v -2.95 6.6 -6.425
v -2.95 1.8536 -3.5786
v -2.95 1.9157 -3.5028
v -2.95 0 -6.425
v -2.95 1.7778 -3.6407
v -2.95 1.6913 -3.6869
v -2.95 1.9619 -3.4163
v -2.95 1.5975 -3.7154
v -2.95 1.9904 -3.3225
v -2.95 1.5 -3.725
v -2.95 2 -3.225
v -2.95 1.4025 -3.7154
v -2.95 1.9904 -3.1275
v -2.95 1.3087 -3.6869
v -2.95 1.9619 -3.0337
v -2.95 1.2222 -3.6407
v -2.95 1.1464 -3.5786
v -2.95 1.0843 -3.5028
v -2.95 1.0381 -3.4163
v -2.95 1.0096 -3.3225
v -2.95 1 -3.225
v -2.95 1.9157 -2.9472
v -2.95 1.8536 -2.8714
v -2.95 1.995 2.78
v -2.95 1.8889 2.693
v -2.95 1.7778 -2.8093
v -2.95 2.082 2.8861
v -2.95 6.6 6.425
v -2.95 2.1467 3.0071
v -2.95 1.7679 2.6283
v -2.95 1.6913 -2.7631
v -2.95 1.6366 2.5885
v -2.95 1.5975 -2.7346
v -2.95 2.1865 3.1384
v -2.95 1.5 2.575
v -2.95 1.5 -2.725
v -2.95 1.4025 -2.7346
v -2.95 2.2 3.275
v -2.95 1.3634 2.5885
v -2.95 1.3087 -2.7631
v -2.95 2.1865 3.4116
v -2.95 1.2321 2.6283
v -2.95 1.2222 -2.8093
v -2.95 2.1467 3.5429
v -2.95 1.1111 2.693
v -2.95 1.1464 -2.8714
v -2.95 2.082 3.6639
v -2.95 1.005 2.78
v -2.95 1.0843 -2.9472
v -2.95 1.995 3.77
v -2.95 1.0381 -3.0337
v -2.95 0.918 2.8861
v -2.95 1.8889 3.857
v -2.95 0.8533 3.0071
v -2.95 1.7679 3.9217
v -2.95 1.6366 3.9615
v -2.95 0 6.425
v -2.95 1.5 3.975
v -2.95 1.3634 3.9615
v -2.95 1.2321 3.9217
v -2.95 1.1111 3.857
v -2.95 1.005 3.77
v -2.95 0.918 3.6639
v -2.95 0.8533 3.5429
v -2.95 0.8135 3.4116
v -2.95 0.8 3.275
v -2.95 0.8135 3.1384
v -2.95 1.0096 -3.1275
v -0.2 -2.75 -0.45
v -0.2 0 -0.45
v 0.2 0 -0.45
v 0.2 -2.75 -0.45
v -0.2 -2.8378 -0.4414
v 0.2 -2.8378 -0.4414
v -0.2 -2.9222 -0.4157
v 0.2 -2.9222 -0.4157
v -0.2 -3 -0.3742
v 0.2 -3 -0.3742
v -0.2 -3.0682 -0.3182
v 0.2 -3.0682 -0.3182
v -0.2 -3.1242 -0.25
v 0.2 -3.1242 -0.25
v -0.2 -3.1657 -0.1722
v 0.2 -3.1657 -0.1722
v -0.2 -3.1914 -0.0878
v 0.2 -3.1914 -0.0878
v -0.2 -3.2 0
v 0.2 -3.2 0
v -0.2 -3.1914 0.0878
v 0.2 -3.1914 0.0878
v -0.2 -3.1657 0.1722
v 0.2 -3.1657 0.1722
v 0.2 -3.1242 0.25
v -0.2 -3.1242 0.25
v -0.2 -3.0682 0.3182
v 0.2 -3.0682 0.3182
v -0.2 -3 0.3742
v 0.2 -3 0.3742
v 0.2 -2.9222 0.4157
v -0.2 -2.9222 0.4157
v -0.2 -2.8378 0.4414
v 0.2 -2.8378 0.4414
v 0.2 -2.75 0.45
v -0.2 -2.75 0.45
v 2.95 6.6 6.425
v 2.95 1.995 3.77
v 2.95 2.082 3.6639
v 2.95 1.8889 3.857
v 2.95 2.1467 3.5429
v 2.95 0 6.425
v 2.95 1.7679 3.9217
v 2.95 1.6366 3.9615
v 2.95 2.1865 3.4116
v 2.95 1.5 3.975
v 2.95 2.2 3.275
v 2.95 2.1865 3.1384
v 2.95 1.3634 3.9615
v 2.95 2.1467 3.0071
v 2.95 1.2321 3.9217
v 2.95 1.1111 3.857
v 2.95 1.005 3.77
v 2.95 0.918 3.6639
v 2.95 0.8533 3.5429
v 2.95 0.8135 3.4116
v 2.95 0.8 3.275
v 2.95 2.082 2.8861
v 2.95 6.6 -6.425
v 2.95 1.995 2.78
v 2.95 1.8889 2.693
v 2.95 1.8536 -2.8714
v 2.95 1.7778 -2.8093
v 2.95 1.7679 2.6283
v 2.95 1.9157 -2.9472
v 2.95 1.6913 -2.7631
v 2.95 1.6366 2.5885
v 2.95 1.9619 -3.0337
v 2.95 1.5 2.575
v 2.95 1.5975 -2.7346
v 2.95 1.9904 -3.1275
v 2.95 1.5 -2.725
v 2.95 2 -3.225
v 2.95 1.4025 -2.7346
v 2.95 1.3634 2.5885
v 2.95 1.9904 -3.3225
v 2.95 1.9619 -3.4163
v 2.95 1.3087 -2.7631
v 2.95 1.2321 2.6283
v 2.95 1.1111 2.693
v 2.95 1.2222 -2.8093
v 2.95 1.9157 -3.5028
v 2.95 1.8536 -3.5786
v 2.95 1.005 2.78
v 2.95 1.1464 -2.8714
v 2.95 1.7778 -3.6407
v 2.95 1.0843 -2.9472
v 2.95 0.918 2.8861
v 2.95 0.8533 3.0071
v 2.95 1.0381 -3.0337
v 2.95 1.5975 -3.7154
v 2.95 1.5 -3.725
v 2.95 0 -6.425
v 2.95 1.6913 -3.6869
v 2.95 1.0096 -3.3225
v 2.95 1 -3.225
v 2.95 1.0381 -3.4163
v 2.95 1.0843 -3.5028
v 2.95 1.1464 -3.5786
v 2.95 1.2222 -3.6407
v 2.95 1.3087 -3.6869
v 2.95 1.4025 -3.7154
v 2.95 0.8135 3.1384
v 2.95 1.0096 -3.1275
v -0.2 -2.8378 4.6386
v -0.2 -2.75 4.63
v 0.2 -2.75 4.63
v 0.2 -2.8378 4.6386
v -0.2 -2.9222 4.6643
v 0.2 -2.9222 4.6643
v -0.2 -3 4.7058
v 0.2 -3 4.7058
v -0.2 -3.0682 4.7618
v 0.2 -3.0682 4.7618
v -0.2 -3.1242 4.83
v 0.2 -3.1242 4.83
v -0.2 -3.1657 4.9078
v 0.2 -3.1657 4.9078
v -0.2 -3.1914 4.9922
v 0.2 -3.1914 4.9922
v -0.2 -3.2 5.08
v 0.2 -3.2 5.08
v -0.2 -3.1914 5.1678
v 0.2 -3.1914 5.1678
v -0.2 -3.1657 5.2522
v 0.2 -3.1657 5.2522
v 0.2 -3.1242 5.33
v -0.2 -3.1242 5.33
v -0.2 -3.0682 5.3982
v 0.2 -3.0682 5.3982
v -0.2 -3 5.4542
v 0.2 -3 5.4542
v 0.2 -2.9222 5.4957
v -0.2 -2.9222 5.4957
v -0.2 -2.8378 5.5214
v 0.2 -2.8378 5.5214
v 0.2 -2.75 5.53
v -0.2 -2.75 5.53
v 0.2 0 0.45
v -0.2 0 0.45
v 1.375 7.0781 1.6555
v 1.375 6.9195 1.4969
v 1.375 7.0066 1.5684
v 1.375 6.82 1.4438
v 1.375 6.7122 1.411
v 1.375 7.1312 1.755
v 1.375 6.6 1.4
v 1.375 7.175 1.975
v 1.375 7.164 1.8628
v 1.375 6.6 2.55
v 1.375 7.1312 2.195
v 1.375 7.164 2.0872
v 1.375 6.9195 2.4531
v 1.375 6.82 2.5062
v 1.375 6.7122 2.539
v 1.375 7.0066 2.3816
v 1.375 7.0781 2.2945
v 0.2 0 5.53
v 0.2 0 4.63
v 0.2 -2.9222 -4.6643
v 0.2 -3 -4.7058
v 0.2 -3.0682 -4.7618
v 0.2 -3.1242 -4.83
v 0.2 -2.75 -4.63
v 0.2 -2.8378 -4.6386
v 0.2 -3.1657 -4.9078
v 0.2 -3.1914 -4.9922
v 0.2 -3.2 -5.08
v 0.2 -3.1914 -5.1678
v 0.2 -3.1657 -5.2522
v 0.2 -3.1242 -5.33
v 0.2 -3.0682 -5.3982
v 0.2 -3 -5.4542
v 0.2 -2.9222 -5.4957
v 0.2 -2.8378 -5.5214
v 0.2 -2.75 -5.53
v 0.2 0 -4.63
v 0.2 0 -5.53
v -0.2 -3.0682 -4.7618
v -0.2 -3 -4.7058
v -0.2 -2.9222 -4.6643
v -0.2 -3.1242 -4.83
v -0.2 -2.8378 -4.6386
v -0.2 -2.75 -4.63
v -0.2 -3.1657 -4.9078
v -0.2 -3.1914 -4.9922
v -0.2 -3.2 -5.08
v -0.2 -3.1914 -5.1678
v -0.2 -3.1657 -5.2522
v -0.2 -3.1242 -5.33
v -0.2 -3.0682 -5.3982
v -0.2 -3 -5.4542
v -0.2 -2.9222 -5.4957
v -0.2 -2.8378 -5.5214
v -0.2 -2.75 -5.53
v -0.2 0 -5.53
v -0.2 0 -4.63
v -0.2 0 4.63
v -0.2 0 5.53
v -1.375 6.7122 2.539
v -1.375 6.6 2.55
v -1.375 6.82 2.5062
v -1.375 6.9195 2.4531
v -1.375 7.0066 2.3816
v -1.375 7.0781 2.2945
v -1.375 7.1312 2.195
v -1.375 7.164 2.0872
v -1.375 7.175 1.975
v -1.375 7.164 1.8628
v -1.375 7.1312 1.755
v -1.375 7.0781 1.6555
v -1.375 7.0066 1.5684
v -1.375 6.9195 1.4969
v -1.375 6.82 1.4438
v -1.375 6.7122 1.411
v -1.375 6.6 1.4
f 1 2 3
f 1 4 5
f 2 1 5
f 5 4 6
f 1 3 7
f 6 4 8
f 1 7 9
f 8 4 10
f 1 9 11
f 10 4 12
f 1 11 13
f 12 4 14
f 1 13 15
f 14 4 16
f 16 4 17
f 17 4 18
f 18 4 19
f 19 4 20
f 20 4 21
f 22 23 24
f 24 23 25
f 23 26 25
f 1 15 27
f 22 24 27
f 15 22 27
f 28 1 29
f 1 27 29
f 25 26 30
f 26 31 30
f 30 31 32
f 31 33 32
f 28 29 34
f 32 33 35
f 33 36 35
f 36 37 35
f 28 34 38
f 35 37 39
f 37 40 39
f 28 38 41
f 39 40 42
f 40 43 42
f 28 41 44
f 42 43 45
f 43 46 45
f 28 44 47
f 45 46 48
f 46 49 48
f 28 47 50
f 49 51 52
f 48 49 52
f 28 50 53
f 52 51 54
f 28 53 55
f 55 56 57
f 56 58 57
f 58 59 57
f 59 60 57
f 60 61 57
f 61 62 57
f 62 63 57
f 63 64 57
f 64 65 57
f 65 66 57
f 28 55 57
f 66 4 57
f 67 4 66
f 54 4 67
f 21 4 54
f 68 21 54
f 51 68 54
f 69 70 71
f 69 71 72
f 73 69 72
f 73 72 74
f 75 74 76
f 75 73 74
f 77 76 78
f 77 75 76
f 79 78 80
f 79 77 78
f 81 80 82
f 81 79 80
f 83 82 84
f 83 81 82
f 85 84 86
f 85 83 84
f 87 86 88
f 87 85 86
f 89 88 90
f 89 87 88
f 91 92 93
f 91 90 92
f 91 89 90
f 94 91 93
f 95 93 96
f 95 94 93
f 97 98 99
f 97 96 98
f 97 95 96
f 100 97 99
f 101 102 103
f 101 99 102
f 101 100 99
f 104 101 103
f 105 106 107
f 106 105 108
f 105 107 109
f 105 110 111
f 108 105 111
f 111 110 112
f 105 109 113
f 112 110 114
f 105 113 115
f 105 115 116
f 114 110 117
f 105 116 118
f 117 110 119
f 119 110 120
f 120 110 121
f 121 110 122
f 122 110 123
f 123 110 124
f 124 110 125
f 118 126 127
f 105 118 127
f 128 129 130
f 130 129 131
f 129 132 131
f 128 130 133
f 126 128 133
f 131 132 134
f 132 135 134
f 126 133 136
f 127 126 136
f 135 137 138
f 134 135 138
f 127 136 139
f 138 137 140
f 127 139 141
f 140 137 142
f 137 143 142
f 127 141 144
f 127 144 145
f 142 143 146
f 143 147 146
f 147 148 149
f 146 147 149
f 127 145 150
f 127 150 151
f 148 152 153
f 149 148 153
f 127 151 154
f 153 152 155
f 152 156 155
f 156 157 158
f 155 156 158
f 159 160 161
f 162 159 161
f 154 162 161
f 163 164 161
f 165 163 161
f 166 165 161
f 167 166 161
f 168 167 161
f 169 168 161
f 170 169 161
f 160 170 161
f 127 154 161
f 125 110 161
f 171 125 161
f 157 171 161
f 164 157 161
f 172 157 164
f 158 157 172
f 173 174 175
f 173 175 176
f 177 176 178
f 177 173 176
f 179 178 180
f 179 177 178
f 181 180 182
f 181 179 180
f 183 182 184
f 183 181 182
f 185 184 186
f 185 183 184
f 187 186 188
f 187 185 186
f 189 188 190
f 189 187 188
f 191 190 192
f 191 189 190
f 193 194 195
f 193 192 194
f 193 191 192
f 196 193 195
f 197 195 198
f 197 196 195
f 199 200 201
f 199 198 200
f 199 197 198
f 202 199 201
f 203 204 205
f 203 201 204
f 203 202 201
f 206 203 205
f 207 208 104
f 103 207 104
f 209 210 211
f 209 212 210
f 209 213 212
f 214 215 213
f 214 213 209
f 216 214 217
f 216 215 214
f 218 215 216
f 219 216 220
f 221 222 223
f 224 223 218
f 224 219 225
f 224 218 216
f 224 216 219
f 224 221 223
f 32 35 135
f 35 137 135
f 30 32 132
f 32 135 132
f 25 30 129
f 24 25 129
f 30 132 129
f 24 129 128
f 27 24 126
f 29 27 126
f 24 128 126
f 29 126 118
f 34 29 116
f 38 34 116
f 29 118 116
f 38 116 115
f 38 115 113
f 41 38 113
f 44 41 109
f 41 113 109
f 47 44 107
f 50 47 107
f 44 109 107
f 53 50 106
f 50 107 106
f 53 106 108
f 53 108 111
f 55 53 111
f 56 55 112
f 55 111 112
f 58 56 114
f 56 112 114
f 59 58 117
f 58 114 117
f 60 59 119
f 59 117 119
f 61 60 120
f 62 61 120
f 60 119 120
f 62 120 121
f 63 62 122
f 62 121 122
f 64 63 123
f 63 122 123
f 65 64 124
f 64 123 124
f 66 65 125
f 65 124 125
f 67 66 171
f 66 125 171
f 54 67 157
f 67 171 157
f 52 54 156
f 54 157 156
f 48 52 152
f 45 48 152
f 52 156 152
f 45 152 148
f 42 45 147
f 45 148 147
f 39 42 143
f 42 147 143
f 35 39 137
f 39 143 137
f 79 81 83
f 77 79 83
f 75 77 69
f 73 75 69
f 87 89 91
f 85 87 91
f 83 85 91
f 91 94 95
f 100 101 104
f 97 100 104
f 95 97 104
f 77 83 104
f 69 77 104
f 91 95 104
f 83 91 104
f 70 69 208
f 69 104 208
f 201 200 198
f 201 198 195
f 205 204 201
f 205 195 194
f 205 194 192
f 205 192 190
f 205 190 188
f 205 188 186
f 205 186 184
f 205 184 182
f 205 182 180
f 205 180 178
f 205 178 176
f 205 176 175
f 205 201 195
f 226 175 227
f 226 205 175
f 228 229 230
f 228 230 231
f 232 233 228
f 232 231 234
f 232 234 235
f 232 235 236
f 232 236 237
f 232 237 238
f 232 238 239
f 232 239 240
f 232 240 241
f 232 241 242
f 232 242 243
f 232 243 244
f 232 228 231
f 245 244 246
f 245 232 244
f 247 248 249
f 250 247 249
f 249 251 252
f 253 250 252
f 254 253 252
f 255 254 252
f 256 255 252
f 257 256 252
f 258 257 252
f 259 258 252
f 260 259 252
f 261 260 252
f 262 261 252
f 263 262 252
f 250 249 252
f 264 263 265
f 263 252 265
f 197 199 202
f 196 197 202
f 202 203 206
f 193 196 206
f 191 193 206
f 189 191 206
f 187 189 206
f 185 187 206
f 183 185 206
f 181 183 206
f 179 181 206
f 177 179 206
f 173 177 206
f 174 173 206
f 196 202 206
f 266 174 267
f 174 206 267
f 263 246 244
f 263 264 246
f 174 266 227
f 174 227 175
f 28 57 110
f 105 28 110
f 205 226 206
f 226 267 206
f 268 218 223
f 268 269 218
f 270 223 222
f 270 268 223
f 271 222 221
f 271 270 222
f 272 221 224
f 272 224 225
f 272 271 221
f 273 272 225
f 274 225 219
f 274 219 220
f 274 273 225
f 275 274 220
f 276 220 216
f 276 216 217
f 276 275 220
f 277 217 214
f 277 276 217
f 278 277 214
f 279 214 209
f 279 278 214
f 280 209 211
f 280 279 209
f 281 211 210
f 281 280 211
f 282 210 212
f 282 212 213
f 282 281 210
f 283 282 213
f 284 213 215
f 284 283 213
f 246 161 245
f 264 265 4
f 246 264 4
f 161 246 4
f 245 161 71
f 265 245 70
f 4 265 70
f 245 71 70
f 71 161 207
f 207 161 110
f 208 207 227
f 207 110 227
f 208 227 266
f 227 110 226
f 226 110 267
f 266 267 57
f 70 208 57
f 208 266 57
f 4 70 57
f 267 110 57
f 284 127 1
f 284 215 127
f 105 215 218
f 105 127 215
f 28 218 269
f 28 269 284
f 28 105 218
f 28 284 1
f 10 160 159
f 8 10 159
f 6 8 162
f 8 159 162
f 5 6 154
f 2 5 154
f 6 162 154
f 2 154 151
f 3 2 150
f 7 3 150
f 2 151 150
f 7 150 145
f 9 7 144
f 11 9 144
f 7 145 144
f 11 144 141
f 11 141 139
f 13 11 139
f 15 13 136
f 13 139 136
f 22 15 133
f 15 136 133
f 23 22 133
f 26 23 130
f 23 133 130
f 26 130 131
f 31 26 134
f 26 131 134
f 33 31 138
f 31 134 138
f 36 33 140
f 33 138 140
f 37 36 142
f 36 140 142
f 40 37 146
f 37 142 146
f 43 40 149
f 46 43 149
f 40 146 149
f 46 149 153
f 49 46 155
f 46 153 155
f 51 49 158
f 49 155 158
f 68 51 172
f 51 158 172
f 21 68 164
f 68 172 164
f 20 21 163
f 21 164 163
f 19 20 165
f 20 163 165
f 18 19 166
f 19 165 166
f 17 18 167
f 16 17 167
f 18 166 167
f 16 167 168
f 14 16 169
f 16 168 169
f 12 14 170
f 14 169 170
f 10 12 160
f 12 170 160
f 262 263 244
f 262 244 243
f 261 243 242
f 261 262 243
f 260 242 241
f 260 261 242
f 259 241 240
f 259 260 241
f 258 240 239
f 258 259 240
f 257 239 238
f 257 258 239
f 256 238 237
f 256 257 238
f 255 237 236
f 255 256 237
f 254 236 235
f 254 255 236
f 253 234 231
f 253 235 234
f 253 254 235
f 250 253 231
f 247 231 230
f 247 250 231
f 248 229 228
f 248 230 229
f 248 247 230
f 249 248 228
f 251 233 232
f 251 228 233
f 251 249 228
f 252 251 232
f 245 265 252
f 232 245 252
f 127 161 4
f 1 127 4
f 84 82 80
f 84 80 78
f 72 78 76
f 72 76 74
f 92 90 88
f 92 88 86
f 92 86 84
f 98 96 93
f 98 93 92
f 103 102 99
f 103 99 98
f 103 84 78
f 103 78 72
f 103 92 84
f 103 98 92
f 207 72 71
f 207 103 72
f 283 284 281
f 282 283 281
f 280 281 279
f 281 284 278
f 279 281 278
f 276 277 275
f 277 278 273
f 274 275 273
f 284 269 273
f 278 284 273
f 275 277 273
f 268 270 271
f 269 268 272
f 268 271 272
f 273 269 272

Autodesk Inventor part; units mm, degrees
ref_plane "YZ Plane" through (0, 0, 0) normal (1, 0, 0) x (0, 1, 0)
ref_plane "XZ Plane" through (0, 0, 0) normal (0, 1, 0) x (-1, 0, 0)
sketch "Sketch1" plane through (0, 0, 0) normal (0, 1, 0) x (-1, 0, 0)
  line L0 (2.95, 6.425) -> (-2.95, 6.425)
  line L1 (-2.95, 6.425) -> (-2.95, -6.425)
  line L2 (-2.95, -6.425) -> (2.95, -6.425)
  line L3 (2.95, -6.425) -> (2.95, 6.425)
  line L4 (4.13, 0) -> (-4.13, 0) construction
  line L5 (0, -8.995) -> (0, 8.995) construction
  point P0 (0, 0)
  dimension "d0" = 5.9
  dimension "d1" = 12.85
extrude "Extrusion1" add sketch "Sketch1" along normal blind 6.6
sketch "Sketch2" plane through (2.95, 0, 6.425) normal (1, 0, 0) x (0, 0, -1)
  circle A0 centre (3.15, 1.5) radius 0.7
  circle A1 centre (9.65, 1.5) radius 0.5
  line L0 (0, 0) -> (0, 6.6) projected
  line L1 (0, 0) -> (12.85, 0) projected
  point P0 (6.425, 0)
  dimension "d4" = 1.4
  dimension "d5" = 1
  dimension "d6" = 3.15
  dimension "d7" = 6.5
  dimension "d8" = 1.5
extrude "Extrusion2" cut sketch "Sketch2" against normal through all
sketch "Sketch3" plane through (0, 0, 0) normal (1, 0, 0) x (0, 1, 0)
  line L0 (6.6, -6.425) -> (6.6, 6.425) projected
  circle A0 centre (6.6, 1.975) radius 0.575
  circle A1 centre (1.5, -3.225) radius 0.5 projected
  point P0 (0, 0)
  point P1 (6.6, 2.55)
  point P2 (6.6, 1.4)
  dimension "d11" = 1.15
  dimension "d12" = 5.2
extrude "Extrusion3" add sketch "Sketch3" along normal mid plane 2.75 contours L0 A0 picked at (6.6832, 2.1477)
sketch "Sketch4" plane through (0, 0, 0) normal (1, 0, 0) x (0, 1, 0)
  line L0 (0, 6.425) -> (0, -6.425) projected
  line L1 (0, 0.45) -> (-2.75, 0.45)
  line L2 (0, -0.45) -> (-2.75, -0.45)
  arc A0 (-2.75, 0.45) -> (-2.75, -0.45) centre (-2.75, 0) ccw
  line L3 (-5.275, 0) -> (9.25, 0) construction
  point P0 (0, 0)
  point P1 (-3.2, 0)
  dimension "d15" = 3.2
  dimension "d16" = 0.9
extrude "Extrusion4" add sketch "Sketch4" along normal mid plane 0.4
pattern_linear "Rectangular Pattern1" count 2 spacing 5.08 along (0, 0, -1) count 2 spacing 5.08 along (0, 0, 1) of "Extrusion4"
ref_plane "Work Plane1" through (0, 2.4, 0) normal (0, 1, 0) x (1, 0, 0)
split_face "Split1"
properties part number "Kailh_GM_8.0_switch"
